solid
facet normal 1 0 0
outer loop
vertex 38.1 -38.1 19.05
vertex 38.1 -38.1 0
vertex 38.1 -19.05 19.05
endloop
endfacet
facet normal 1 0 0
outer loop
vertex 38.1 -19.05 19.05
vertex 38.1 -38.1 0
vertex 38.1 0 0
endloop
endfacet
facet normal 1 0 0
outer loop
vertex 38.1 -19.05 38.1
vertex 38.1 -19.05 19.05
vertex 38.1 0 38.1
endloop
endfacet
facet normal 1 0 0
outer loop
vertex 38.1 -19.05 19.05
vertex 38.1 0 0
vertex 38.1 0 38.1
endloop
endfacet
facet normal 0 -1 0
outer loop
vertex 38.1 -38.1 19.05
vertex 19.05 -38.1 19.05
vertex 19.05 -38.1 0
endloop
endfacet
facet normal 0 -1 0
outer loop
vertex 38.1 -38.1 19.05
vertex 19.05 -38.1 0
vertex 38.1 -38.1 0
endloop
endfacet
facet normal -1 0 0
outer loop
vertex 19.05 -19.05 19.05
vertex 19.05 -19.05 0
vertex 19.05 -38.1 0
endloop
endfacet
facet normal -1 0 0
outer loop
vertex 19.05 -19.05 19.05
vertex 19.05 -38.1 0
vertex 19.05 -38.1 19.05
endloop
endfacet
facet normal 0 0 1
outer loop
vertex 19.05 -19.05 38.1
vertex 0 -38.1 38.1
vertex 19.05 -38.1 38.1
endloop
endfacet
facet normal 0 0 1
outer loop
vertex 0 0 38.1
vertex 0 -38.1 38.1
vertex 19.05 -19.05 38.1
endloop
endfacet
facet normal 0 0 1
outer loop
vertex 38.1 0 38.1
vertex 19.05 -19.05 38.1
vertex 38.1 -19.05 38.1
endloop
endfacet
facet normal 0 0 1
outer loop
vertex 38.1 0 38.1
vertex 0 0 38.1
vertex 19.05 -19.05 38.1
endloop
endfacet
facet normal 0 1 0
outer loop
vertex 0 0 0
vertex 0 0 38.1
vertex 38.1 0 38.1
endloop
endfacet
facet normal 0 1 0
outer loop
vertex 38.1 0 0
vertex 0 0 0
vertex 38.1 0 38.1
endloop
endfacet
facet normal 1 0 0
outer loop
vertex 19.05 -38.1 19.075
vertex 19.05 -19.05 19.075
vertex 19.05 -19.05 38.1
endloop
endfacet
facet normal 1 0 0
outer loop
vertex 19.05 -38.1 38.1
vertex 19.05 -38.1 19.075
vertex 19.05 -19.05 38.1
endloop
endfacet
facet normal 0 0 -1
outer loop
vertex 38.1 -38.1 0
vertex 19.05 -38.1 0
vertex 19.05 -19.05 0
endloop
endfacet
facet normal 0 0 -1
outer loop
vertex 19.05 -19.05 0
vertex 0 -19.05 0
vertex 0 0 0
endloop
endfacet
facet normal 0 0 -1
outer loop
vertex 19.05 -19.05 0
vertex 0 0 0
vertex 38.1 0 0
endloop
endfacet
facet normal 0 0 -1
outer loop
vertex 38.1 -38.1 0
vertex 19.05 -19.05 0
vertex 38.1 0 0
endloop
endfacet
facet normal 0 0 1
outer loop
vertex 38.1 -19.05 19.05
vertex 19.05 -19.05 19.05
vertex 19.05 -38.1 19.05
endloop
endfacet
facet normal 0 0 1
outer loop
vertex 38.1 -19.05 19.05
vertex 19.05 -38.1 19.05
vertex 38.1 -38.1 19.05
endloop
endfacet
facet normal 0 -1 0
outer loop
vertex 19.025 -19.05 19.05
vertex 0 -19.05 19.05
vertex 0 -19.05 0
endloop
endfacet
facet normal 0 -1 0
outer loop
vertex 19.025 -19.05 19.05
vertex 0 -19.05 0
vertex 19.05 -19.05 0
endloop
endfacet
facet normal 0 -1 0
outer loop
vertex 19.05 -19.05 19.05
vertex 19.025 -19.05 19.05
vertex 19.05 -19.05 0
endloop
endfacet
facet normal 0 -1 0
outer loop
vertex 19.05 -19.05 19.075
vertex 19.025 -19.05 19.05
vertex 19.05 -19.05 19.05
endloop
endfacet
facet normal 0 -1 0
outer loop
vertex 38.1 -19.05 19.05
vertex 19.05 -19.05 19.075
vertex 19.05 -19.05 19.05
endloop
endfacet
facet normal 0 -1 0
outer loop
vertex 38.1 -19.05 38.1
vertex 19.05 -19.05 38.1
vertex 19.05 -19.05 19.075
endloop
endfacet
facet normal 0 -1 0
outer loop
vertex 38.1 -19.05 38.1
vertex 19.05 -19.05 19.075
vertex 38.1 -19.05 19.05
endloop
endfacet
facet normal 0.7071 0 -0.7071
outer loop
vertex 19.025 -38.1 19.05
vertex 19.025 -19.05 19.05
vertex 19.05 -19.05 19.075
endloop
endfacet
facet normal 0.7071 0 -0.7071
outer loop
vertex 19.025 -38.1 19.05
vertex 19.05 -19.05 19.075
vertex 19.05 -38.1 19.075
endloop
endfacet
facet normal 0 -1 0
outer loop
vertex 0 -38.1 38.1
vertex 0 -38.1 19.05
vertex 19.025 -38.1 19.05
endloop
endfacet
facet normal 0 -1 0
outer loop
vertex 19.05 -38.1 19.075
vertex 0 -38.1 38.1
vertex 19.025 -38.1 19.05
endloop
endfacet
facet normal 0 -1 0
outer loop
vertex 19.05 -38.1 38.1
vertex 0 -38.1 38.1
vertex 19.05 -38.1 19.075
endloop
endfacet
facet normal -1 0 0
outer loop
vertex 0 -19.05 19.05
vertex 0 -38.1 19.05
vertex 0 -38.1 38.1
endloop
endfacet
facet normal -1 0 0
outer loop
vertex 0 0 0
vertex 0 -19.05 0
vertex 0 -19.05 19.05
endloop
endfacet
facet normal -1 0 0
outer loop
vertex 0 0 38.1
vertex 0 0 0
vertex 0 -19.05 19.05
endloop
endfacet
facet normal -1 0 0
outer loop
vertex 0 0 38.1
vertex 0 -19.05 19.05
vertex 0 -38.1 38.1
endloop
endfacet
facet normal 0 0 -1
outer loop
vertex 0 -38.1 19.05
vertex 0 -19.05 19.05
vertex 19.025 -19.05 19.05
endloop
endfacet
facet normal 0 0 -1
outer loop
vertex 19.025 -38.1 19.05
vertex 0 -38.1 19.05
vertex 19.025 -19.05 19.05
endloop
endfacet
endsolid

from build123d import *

# Parameters (mm, degrees)
F0_W     = 38.1
F0_H     = 38.1
F1_DEPTH = 19.05
F2_W     = 19.05
F2_H     = 19.05
F3_DEPTH = 19.05
F5_SIZE  = 0.0254
F4_W     = 19.05
F4_H     = 19.05
F6_DEPTH = 19.05


with BuildPart() as f1:
    # F0 (on Front) → F1 (new body)
    with BuildSketch(Plane.XZ):
        with Locations((19.05, 19.05)):
            Rectangle(F0_W, F0_H)
    extrude(amount=F1_DEPTH)

    # F2 (on face) → F3 (join)
    with BuildSketch(Plane.XZ.offset(19.05)):
        with Locations((9.525, 28.575)):
            Rectangle(F2_W, F2_H)
    extrude(amount=F3_DEPTH)

    # F5
    f5_edges = [f1.edges().sort_by_distance(p)[0] for p in [
        (19.05, -28.575, 19.05),
    ]]
    chamfer(f5_edges, length=F5_SIZE)

    # F4 (on face) → F6 (join)
    with BuildSketch(Plane.XZ.offset(19.05)):
        with Locations((28.575, 9.525)):
            Rectangle(F4_W, F4_H)
    extrude(amount=F6_DEPTH)


solid = f1.part
